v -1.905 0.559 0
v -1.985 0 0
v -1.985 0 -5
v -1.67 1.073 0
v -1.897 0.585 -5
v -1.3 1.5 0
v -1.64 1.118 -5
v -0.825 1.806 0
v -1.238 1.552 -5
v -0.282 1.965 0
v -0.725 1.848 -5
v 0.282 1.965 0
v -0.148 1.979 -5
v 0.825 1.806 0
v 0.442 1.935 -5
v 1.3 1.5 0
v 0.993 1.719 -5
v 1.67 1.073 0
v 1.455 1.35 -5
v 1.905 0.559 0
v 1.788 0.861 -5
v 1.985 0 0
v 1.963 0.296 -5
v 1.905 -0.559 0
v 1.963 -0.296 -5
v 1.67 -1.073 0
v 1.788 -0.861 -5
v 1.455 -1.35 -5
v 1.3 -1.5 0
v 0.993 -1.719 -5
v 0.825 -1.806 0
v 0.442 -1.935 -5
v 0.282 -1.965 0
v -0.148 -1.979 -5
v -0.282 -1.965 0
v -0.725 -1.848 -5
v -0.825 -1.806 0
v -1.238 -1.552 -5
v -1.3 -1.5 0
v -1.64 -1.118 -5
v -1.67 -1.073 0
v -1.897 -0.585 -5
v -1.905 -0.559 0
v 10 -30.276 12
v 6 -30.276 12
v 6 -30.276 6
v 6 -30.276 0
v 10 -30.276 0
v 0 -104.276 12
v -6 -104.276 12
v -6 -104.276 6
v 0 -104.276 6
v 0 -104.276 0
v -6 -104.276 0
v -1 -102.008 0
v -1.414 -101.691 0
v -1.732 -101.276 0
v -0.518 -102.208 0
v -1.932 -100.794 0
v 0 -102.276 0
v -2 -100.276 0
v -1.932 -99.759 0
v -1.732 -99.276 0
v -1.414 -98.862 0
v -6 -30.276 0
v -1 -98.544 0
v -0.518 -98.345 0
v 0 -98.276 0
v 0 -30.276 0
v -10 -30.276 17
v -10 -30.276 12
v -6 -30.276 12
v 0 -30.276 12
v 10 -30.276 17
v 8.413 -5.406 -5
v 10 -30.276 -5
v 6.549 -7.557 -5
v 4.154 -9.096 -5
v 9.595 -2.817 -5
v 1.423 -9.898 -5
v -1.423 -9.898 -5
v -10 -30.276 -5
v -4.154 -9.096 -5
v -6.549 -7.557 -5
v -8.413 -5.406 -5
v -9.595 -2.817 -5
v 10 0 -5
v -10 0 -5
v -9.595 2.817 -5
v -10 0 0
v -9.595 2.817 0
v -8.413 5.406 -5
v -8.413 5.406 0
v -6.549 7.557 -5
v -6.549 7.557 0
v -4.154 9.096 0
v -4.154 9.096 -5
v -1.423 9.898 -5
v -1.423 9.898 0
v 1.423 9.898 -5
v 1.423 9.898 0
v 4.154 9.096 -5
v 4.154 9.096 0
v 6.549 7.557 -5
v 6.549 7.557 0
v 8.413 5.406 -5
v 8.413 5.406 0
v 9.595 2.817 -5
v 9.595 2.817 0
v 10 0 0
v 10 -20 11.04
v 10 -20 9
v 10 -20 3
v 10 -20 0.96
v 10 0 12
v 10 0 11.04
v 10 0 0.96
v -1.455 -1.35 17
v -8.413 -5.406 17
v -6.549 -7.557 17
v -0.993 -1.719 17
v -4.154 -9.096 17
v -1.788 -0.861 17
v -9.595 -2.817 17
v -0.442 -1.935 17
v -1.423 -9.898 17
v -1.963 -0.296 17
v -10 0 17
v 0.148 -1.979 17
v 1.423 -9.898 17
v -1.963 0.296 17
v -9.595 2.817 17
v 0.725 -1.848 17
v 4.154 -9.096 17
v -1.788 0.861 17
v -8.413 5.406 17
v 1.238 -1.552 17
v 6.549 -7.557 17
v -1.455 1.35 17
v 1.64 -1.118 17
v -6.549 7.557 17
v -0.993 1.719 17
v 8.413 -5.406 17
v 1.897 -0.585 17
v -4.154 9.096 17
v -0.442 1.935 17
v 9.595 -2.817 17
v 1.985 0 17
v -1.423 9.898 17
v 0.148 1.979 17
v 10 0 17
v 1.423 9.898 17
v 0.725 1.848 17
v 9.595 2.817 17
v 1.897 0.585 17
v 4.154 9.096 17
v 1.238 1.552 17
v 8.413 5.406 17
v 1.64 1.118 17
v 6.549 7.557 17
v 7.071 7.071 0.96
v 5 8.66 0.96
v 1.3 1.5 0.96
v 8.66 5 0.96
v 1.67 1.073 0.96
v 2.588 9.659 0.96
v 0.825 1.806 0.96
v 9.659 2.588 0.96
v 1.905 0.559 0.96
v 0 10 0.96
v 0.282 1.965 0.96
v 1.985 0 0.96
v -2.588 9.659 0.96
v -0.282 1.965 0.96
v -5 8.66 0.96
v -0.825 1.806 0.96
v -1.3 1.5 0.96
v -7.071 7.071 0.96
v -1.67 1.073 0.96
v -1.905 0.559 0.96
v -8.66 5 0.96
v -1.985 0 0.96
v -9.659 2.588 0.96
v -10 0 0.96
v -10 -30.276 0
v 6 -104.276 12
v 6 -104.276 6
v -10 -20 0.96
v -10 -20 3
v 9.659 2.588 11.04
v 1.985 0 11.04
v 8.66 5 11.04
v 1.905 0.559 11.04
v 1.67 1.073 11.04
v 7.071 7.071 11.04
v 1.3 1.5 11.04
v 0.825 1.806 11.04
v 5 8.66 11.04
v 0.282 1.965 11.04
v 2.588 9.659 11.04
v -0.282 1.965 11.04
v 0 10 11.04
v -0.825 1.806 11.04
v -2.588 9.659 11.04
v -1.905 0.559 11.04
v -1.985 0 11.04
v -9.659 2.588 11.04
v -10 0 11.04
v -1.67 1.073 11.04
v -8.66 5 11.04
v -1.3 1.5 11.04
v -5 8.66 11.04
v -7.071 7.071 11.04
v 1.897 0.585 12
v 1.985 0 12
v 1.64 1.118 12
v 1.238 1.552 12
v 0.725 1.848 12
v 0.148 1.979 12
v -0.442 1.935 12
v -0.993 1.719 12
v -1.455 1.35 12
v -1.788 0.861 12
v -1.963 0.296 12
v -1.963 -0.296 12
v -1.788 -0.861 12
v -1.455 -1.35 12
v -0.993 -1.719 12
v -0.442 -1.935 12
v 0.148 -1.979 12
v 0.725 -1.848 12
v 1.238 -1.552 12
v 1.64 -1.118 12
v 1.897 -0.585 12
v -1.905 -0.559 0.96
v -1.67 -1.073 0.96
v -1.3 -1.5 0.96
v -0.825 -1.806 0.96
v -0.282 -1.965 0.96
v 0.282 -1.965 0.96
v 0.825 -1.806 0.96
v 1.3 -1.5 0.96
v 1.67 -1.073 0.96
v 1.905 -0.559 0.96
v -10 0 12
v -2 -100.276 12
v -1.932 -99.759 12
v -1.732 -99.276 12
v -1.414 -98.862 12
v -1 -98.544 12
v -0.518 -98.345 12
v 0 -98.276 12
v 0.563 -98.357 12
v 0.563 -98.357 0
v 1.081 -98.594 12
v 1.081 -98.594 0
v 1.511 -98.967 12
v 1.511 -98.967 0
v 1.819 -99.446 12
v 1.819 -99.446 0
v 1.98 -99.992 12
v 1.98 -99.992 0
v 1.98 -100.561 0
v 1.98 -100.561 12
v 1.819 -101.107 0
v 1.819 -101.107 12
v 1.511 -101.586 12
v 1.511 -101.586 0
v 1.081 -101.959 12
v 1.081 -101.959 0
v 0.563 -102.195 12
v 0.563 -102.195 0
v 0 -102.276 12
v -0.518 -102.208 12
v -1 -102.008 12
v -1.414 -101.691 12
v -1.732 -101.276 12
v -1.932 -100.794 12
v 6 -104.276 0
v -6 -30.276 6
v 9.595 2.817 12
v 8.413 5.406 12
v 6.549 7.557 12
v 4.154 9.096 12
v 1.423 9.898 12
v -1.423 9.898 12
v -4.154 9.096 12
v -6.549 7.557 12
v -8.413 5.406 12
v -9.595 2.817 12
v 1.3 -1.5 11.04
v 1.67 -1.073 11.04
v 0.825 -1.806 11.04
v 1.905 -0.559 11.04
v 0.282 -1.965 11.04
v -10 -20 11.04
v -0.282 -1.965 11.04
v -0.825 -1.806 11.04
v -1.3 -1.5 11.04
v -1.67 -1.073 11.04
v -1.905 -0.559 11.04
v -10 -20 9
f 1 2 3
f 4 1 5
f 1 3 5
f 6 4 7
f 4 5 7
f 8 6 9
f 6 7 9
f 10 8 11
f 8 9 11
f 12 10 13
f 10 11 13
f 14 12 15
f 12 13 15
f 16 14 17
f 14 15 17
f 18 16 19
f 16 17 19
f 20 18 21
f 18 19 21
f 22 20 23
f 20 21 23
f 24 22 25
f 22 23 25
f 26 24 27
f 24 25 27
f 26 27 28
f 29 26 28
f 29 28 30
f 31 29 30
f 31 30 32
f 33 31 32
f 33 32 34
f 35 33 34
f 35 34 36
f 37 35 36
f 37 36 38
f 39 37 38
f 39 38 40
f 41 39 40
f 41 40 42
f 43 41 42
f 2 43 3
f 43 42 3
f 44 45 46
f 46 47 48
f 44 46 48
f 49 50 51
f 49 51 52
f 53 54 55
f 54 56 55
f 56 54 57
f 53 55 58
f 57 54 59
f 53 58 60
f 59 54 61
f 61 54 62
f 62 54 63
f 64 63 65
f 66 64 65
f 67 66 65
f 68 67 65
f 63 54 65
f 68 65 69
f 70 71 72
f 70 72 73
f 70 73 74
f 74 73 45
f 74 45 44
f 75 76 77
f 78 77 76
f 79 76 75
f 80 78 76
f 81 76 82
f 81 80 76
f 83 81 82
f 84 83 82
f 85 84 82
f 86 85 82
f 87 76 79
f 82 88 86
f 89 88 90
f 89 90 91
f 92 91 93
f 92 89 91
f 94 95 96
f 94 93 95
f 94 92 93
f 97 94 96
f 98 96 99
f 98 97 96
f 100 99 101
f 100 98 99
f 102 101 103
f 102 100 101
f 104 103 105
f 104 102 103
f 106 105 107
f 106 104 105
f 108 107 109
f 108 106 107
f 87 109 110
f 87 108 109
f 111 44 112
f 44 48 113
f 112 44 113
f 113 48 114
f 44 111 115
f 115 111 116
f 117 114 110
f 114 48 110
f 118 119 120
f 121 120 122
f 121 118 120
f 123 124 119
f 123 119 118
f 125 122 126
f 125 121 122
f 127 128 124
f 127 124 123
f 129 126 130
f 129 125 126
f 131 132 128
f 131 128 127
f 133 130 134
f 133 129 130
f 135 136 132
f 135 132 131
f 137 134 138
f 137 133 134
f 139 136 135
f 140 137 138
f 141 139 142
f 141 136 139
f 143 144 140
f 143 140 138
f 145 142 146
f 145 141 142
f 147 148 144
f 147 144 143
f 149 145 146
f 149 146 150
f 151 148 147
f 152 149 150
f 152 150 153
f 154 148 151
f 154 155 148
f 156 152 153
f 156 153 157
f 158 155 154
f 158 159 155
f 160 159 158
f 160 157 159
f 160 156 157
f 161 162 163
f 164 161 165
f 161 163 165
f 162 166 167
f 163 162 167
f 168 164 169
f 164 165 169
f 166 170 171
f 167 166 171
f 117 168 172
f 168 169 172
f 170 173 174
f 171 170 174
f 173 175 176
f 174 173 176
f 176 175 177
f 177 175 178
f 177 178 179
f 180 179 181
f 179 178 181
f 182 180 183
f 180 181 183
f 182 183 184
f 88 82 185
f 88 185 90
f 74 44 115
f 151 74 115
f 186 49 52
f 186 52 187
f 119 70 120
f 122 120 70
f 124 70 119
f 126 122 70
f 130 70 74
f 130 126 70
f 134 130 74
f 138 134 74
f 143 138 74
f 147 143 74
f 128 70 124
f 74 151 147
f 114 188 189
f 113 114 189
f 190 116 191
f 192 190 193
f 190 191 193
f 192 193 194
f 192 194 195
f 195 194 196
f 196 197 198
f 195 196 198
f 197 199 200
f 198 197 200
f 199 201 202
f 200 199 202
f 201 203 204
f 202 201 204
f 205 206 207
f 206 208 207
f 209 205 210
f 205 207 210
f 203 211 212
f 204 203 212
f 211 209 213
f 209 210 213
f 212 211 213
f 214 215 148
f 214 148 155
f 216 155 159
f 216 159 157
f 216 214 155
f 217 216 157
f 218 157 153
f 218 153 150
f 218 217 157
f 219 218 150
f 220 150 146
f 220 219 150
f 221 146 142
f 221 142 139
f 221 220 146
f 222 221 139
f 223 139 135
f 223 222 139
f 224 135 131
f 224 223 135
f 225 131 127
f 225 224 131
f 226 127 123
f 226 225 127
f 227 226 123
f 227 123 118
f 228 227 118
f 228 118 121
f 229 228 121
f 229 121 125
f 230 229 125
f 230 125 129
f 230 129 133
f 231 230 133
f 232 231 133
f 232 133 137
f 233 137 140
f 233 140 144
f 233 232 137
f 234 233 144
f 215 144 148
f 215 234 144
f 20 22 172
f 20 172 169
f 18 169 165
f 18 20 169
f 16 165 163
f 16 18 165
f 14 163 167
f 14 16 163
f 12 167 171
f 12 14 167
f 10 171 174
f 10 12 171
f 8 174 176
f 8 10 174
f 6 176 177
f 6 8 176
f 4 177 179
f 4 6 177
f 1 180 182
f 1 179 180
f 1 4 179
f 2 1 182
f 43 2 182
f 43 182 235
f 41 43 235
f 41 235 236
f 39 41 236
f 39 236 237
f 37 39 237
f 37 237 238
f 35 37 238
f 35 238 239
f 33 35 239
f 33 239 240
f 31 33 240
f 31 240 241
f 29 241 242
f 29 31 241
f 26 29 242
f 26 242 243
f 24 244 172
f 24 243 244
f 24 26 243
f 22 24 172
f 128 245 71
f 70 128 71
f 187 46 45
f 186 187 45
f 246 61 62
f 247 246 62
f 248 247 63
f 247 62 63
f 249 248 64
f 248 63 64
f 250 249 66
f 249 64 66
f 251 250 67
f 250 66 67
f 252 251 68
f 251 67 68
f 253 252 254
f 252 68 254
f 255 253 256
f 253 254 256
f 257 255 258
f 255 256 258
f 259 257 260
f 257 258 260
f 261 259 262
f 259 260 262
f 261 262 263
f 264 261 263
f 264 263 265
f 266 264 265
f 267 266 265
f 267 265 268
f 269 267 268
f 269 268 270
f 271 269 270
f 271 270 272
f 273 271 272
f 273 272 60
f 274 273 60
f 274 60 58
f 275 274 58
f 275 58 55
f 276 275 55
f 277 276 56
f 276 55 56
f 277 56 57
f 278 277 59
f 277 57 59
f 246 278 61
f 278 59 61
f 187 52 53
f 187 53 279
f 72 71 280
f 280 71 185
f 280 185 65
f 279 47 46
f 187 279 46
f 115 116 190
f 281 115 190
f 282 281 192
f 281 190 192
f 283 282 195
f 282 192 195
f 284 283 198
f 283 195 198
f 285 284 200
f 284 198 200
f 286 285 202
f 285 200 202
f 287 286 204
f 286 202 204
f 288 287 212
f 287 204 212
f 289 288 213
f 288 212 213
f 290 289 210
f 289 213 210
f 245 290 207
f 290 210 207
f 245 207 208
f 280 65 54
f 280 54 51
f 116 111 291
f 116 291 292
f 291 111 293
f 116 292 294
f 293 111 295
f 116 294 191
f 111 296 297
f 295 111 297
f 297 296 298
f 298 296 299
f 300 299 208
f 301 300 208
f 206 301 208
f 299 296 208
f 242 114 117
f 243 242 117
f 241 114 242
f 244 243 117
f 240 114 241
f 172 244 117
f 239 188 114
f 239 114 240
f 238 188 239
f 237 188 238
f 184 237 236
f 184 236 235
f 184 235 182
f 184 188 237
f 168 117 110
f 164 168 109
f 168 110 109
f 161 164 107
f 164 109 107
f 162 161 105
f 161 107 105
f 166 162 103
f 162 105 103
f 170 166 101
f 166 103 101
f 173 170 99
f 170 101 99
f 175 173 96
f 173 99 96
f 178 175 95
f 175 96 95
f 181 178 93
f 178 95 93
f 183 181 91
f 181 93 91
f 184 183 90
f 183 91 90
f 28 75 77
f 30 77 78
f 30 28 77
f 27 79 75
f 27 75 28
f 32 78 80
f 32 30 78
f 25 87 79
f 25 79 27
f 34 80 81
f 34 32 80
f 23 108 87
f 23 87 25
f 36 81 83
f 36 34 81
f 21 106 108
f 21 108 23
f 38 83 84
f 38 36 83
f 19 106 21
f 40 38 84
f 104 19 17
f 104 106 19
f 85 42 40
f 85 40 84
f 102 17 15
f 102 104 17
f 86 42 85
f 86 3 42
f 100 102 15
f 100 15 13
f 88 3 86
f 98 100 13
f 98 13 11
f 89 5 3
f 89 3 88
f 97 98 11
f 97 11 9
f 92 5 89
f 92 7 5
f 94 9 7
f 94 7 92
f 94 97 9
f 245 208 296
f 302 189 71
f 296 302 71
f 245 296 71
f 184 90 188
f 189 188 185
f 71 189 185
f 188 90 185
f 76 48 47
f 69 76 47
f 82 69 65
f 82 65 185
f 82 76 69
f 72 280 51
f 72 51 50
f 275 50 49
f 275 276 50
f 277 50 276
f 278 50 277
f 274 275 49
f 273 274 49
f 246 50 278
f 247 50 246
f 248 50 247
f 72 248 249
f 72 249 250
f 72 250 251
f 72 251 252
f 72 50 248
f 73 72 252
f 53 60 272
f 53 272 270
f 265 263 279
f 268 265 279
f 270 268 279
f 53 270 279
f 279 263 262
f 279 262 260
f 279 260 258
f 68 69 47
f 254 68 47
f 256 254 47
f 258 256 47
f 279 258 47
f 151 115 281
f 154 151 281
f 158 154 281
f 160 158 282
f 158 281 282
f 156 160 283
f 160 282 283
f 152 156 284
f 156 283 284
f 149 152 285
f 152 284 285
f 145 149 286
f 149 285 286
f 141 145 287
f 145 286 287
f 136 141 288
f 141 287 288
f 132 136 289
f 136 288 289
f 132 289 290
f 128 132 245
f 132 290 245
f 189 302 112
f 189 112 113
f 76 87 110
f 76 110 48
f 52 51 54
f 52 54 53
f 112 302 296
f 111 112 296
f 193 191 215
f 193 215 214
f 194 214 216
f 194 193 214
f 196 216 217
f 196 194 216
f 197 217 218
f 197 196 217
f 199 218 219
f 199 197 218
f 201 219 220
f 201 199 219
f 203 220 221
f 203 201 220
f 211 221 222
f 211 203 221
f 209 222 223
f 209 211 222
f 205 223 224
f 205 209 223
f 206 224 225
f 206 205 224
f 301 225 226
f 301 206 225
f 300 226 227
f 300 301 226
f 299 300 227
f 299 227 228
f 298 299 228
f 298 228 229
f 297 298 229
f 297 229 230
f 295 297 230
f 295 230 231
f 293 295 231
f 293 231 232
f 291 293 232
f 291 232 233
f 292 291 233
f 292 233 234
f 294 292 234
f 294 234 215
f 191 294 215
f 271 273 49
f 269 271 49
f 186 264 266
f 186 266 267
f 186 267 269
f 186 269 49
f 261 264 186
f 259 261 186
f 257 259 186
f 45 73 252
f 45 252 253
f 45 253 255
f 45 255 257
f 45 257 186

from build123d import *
from build123d.topology import SkipClean

# Parameters (mm, degrees)
SKETCH_1_R          = 1.985
EXTRUDE_1_DEPTH     = 12
CUT_EXTRUDE_1_DEPTH = 39.218600963
CUT_EXTRUDE_6_DEPTH = 39.218600963
SKETCH_12_R         = 1.985
EXTRUDE_11_DEPTH    = 5
EXTRUDE_START       = 5
SKETCH_13_R         = 1.985
EXTRUDE_12_DEPTH    = 5
SKETCH_14_W         = 2.04
SKETCH_14_H         = 20
CUT_EXTRUDE_7_DEPTH = 41.070705753
SKETCH_15_W         = 6
SKETCH_15_H         = 6
EXTRUDE_13_DEPTH    = 74
SKETCH_17_R         = 2
CUT_EXTRUDE_8_DEPTH = 107.125262104


with BuildPart() as part:
    # 草圖1 → 填料-伸長1 (new body)
    with BuildSketch(Plane.XY):
        with BuildLine():
            Line((-10, 0), (-10, -30.276417548))
            Line((-10, -30.276417548), (10, -30.276417548))
            Line((10, -30.276417548), (10, 0))
            ThreePointArc((10, 0), (0, 10), (-10, 0))
        make_face()
        Circle(SKETCH_1_R, mode=Mode.SUBTRACT)
    extrude(amount=EXTRUDE_1_DEPTH)

    # 草圖2 → 除料-伸長1 (cut, through all)
    with BuildSketch(Plane(origin=(10, 0, 0), x_dir=(0, 0, -1), z_dir=(1, 0, 0))):
        Polygon((-9, 0), (-6, 0), (-3, 0), (-3, 15.780779257), (-9, 15.780779257), align=None)
        Polygon((-3, 0), (-6, 0), (-9, 0), (-8.60053373, -20), (-3, -20), align=None)
    extrude(amount=-CUT_EXTRUDE_1_DEPTH, mode=Mode.SUBTRACT)

    # 草圖11 → 除料-伸長6 (cut, through all)
    with BuildSketch(Plane(origin=(10, 0, 0), x_dir=(0, 0, -1), z_dir=(1, 0, 0))):
        Polygon((-9, 0), (-9, -20), (-8.60053373, -20), align=None)
    extrude(amount=-CUT_EXTRUDE_6_DEPTH, mode=Mode.SUBTRACT)

    # 草圖12 → 填料-伸長11 (add)
    # profile 1 of 2: a face of its own
    with BuildSketch(Plane.XY.offset(12)):
        with BuildLine():
            ThreePointArc((10, 0), (0, 10), (-10, 0))
            ThreePointArc((-10, 0), (0, -10), (10, 0))
        make_face()
        Circle(SKETCH_12_R, mode=Mode.SUBTRACT)
    # profile 2 of 2: a face of its own
    with BuildSketch(Plane.XY.offset(12)):
        with BuildLine():
            ThreePointArc((10, 0), (0, -10), (-10, 0))
            Line((-10, 0), (-10, -30.276417548))
            Line((-10, -30.276417548), (10, -30.276417548))
            Line((10, -30.276417548), (10, 0))
        make_face()
    extrude(amount=EXTRUDE_11_DEPTH)

    # 草圖13 → 填料-伸長12 (add)
    # profile 1 of 2: a face of its own
    with SkipClean():  # the faces are left unmerged after this step: merging them gives an invalid solid
        with BuildSketch(Plane(origin=(0, 0, 0), x_dir=(-1, 0, 0), z_dir=(0, 0, -1)).offset(EXTRUDE_START)):
            with BuildLine():
                ThreePointArc((10, 0), (0, 10), (-10, 0))
                ThreePointArc((-10, 0), (0, -10), (10, 0))
            make_face()
            Circle(SKETCH_13_R, mode=Mode.SUBTRACT)
        # profile 2 of 2: a face of its own
        with BuildSketch(Plane(origin=(0, 0, 0), x_dir=(-1, 0, 0), z_dir=(0, 0, -1)).offset(EXTRUDE_START)):
            with BuildLine():
                ThreePointArc((10, 0), (0, -10), (-10, 0))
                Line((-10, 0), (-10, -30.276417548))
                Line((-10, -30.276417548), (10, -30.276417548))
                Line((10, -30.276417548), (10, 0))
            make_face()
        extrude(amount=-EXTRUDE_12_DEPTH)

    # 草圖14 → 除料-伸長7 (cut, through all)
    with SkipClean():  # the faces are left unmerged after this step: merging them gives an invalid solid
        with BuildSketch(Plane.ZY.offset(10)):
            Polygon((3, 0), (3, -20), (9, -20), (9, 0), (11.04, 0), (11.04, 10), (3, 10), (0.96, 10), (0.96, 0), align=None)
            with Locations((1.98, -10)):
                Rectangle(SKETCH_14_W, SKETCH_14_H)
            with Locations((10.02, -10)):
                Rectangle(SKETCH_14_W, SKETCH_14_H)
        extrude(amount=-CUT_EXTRUDE_7_DEPTH, mode=Mode.SUBTRACT)

    # 草圖15 → 填料-伸長13 (add)
    with SkipClean():  # the faces are left unmerged after this step: merging them gives an invalid solid
        with BuildSketch(Plane.XZ.offset(30.276417548)):
            with Locations((3, 9)):
                Rectangle(SKETCH_15_W, SKETCH_15_H)
            with Locations((-3, 9)):
                Rectangle(SKETCH_15_W, SKETCH_15_H)
            with Locations((3, 3)):
                Rectangle(SKETCH_15_W, SKETCH_15_H)
            with Locations((-3, 3)):
                Rectangle(SKETCH_15_W, SKETCH_15_H)
        extrude(amount=EXTRUDE_13_DEPTH)

    # 草圖17 → 除料-伸長8 (cut, through all)
    with SkipClean():  # the faces are left unmerged after this step: merging them gives an invalid solid
        with BuildSketch(Plane(origin=(0, 0, 0), x_dir=(-1, 0, 0), z_dir=(0, 0, -1))):
            with Locations((0, -100.276417548)):
                Circle(SKETCH_17_R)
        extrude(amount=-CUT_EXTRUDE_8_DEPTH, mode=Mode.SUBTRACT)


solid = part.part
